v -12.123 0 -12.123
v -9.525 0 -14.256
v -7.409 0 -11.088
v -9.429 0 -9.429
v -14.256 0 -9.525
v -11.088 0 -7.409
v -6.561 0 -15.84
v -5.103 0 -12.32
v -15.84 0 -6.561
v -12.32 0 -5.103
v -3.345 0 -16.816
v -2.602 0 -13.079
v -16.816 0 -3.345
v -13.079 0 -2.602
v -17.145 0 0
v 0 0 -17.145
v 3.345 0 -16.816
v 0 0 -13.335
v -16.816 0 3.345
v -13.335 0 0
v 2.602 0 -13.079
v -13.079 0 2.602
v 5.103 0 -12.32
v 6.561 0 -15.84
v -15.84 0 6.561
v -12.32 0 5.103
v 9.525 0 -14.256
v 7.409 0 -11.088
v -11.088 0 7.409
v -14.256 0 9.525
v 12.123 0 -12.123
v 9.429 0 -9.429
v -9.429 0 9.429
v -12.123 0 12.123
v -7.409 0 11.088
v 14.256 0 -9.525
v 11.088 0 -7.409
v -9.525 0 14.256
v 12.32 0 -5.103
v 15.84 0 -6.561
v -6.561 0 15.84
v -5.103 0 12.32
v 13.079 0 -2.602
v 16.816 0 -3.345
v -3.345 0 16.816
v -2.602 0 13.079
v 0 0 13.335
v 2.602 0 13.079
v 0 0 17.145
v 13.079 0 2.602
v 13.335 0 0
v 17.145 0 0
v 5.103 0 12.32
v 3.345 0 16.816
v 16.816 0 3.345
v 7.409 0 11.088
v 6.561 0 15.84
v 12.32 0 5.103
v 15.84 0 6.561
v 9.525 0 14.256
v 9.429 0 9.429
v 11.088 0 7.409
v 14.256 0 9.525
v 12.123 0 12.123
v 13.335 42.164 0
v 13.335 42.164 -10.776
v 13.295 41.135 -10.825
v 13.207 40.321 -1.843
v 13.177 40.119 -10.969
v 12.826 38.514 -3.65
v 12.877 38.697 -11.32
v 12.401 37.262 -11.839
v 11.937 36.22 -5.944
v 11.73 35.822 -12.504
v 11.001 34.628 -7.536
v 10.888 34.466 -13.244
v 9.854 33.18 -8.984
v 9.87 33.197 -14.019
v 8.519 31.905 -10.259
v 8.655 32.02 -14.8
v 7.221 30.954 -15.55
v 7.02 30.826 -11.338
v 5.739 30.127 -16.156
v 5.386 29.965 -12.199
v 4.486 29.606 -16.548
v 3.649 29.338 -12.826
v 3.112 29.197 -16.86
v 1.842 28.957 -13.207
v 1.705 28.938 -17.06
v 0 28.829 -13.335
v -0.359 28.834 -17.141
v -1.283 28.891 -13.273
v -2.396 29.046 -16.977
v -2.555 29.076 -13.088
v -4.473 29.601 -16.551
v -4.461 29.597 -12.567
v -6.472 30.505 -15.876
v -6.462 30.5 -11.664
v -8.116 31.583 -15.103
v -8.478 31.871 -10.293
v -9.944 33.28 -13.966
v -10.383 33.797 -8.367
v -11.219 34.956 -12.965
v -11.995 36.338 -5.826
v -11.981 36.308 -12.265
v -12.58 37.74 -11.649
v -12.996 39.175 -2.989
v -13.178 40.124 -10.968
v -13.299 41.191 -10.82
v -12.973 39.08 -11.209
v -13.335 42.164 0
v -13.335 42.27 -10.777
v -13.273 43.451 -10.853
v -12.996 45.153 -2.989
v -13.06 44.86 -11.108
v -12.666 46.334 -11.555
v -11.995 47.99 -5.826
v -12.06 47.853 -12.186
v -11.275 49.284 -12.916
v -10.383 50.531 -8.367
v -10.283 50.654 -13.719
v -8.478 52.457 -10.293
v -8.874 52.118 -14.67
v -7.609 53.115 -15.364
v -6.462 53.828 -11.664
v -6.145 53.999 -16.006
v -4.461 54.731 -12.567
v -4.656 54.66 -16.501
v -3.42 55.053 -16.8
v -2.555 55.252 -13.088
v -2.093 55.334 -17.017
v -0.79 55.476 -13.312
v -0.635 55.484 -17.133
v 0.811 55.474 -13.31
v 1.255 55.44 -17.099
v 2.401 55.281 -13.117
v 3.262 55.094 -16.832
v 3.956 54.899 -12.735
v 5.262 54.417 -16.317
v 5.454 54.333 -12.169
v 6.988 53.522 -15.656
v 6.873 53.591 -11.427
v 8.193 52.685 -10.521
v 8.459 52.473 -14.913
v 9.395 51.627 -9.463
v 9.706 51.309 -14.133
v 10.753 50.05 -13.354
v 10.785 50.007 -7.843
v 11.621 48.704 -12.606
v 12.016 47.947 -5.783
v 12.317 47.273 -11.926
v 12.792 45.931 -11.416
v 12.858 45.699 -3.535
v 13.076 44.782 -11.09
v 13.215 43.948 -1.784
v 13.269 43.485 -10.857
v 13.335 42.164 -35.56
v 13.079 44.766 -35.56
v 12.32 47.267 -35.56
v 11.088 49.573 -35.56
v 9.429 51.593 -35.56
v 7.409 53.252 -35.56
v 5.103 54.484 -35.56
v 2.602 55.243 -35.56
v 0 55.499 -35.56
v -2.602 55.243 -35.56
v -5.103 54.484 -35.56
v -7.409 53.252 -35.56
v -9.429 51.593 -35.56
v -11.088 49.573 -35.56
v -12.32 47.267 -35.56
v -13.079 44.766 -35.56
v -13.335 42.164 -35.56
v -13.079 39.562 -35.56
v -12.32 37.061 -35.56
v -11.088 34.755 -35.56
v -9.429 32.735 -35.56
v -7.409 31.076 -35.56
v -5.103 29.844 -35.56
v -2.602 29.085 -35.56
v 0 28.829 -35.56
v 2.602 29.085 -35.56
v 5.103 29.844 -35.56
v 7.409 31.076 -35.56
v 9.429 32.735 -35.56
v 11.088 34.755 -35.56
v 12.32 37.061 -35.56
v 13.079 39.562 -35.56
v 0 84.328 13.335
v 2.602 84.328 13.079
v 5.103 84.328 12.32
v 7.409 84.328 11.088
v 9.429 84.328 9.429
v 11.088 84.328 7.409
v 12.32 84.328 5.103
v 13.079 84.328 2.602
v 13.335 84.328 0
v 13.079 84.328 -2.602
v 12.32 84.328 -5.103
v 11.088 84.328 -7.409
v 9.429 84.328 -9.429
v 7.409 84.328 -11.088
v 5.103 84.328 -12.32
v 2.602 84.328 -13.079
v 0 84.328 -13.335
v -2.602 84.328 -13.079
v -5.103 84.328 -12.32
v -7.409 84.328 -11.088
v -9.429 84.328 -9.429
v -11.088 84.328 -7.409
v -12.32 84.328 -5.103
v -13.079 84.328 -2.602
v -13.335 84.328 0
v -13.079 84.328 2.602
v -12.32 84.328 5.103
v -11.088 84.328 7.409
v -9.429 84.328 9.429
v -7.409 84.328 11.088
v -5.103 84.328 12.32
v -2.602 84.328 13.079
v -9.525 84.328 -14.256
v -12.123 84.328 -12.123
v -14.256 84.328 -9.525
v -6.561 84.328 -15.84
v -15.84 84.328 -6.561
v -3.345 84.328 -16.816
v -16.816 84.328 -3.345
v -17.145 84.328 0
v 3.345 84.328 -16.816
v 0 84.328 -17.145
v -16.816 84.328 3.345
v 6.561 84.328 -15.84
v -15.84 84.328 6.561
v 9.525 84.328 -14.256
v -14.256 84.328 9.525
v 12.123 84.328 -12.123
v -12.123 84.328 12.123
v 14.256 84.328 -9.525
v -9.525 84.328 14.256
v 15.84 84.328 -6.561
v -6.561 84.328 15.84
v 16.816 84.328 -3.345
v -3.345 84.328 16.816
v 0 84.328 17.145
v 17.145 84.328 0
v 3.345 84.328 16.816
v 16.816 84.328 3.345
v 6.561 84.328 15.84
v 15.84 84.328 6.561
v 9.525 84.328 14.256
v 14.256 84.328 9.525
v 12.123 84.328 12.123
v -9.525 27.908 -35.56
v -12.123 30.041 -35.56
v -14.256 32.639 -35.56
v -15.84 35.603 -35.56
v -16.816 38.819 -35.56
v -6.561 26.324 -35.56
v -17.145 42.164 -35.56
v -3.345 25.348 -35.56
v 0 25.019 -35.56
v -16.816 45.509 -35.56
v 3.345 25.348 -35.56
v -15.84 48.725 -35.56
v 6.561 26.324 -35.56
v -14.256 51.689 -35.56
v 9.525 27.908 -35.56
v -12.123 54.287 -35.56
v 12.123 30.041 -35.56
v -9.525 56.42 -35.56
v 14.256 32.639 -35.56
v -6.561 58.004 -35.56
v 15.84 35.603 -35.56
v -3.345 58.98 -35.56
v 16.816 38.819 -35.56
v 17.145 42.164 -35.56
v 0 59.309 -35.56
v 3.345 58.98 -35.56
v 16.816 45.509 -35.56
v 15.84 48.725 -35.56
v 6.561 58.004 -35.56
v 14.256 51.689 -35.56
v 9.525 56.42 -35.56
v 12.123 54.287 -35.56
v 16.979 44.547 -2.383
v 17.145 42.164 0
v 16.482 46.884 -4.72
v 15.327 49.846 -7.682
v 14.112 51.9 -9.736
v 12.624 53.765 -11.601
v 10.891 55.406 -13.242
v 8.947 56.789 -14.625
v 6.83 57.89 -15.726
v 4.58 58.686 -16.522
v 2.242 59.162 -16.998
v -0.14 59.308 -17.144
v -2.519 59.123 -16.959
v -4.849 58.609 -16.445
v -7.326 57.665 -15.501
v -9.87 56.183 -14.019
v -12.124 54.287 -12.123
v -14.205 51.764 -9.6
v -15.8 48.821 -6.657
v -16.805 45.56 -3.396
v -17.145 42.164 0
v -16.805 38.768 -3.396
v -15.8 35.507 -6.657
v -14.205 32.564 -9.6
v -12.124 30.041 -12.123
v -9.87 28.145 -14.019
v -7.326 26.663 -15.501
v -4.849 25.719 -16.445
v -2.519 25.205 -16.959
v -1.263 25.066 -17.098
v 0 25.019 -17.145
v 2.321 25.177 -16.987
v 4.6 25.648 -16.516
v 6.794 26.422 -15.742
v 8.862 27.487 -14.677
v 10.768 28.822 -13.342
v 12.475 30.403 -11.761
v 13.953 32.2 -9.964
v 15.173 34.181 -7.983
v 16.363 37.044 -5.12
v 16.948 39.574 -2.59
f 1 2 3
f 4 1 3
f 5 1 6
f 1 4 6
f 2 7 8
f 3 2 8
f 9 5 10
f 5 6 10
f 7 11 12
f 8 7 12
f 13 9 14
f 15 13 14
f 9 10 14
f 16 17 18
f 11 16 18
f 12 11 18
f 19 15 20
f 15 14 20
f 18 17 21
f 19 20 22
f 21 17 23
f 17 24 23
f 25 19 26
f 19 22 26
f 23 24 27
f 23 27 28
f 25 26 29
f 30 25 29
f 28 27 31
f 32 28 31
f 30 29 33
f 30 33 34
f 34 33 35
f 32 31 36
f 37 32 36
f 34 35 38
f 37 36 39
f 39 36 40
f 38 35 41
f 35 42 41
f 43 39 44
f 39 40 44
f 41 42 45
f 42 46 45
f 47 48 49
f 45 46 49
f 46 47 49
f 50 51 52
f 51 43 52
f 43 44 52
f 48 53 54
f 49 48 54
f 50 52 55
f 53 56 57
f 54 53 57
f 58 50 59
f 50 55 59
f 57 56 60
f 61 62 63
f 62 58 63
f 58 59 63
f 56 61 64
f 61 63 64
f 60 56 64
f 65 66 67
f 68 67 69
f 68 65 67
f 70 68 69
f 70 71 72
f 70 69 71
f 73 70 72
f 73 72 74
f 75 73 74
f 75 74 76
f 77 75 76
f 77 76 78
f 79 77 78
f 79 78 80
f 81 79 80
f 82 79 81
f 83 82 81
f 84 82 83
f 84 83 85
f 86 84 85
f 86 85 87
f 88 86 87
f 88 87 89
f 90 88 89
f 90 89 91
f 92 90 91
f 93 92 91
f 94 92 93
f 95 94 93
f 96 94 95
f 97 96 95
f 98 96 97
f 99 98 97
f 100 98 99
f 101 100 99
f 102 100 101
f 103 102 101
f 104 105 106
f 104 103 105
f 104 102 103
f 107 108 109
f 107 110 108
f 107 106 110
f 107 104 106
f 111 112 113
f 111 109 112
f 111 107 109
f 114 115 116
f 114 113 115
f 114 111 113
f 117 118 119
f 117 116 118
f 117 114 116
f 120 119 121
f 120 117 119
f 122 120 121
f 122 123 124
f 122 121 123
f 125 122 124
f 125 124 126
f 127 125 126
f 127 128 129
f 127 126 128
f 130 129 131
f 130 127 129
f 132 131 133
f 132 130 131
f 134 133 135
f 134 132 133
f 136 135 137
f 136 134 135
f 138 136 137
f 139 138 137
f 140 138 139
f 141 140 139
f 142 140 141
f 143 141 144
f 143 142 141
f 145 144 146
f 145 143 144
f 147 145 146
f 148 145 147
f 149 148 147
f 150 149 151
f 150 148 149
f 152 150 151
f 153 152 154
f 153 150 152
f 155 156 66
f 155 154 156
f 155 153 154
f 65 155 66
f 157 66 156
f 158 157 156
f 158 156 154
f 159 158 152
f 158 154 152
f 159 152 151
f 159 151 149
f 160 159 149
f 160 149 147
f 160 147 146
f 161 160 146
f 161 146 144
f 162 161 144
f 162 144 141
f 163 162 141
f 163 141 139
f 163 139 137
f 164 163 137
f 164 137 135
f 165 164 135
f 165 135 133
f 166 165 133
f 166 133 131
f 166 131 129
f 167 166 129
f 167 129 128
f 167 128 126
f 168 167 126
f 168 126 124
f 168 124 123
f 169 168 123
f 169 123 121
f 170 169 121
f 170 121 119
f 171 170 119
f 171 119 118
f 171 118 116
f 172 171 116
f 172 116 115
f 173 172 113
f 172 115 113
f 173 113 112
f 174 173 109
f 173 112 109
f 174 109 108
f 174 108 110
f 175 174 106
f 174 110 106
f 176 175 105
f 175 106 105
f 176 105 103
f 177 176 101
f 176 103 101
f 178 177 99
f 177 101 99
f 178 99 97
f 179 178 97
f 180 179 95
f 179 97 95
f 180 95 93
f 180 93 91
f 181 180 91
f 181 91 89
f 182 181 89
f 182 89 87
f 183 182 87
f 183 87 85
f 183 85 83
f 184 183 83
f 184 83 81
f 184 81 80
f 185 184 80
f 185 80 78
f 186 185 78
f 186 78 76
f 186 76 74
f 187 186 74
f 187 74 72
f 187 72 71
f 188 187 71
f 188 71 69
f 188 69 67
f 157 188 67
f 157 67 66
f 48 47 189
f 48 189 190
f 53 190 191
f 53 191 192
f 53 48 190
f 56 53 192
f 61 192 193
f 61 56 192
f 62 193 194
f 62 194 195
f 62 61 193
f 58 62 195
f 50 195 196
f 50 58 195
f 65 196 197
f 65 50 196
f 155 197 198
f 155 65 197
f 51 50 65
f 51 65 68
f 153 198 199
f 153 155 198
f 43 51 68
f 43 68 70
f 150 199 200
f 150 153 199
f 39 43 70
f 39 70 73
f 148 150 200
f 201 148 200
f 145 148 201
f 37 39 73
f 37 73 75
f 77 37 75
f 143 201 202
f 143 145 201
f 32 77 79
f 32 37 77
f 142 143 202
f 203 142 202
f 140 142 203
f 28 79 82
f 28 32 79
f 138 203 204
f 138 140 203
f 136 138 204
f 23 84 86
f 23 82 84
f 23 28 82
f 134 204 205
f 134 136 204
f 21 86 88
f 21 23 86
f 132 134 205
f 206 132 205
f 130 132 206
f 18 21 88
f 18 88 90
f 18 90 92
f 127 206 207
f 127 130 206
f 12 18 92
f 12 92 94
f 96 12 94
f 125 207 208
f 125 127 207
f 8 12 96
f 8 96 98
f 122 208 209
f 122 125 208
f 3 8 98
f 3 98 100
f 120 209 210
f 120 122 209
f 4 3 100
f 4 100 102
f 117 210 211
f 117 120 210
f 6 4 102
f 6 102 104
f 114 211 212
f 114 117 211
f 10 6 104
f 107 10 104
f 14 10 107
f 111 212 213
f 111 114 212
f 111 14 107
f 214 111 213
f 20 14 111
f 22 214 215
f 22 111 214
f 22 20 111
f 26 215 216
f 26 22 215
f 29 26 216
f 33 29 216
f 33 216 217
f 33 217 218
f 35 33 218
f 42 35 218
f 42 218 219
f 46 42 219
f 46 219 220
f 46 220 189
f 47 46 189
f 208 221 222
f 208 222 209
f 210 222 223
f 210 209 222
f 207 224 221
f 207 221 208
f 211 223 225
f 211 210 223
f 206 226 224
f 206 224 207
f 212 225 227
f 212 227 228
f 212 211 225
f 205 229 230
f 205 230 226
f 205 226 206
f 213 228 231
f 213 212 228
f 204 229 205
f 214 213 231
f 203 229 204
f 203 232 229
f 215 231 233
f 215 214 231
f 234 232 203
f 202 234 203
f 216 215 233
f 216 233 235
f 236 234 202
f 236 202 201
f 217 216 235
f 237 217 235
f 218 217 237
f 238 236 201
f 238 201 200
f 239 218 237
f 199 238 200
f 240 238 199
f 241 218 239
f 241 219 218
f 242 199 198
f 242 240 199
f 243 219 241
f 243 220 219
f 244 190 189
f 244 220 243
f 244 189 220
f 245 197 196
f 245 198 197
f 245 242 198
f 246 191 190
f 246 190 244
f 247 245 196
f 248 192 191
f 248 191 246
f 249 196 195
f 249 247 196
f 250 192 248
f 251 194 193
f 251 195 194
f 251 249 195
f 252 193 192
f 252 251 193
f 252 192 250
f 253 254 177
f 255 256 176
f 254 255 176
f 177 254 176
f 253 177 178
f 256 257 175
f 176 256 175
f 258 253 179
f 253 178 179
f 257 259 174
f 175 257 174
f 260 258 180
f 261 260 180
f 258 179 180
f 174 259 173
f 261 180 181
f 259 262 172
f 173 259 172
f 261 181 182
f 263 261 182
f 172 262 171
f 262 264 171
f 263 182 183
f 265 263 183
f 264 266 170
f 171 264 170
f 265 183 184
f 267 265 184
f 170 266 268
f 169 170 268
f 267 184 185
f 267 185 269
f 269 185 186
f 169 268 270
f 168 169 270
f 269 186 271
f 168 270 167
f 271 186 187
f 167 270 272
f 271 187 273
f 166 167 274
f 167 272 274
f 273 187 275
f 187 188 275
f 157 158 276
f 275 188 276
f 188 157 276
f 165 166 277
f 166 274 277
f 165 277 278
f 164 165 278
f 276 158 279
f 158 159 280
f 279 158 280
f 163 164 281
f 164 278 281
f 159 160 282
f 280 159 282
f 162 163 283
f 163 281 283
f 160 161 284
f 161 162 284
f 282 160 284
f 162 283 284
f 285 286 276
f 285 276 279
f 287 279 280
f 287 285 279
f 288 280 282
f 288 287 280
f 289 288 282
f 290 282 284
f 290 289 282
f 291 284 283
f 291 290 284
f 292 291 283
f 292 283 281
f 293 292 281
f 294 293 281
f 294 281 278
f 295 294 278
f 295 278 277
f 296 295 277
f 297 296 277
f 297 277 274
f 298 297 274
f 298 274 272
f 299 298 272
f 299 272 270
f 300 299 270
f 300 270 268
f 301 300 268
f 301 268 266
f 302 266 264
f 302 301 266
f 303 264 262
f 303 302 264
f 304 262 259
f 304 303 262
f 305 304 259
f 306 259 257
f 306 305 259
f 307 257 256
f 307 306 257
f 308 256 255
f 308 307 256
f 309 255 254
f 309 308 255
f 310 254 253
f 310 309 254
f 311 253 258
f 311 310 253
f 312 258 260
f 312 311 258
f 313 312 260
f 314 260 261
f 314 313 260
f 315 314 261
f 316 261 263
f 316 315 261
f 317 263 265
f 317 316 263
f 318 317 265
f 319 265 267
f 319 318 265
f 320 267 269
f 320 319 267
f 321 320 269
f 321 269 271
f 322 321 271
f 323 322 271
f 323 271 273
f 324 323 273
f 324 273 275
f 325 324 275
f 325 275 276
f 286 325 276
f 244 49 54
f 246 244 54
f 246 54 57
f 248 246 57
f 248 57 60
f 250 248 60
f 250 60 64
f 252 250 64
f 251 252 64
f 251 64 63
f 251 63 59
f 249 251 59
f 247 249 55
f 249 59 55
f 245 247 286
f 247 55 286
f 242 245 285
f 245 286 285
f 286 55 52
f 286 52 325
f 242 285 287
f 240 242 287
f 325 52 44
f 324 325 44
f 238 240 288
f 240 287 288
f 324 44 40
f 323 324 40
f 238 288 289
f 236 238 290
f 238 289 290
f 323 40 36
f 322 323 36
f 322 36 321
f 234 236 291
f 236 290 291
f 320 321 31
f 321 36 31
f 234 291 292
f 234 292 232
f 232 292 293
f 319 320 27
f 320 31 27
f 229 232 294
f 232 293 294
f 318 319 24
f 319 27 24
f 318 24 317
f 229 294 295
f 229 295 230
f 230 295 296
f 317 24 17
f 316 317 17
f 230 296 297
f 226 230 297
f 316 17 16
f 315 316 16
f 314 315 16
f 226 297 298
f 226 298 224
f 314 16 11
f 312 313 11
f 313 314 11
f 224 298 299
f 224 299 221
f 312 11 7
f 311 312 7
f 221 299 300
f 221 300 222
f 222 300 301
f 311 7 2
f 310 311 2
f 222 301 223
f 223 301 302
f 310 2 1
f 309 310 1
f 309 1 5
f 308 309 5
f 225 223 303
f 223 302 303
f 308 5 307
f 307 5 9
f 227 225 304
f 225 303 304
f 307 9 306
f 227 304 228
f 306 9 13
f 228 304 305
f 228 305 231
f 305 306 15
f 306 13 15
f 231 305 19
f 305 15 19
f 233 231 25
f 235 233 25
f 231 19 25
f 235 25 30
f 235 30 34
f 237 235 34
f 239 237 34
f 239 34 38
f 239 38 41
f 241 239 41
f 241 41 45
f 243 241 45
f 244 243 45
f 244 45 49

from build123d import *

# Parameters (mm, degrees)
SKETCH1_R           = 17.145
SKETCH1_R_2         = 13.335
BOSS_EXTRUDE1_DEPTH = 84.328
SKETCH2_R           = 17.145
SKETCH2_R_2         = 13.335
BOSS_EXTRUDE2_DEPTH = 35.56
SKETCH3_R           = 13.335
CUT_EXTRUDE1_DEPTH  = 94.111096186
CUT_EXTRUDE2_START  = -35.56
SKETCH4_R           = 13.335
CUT_EXTRUDE2_DEPTH  = 35.56


with BuildPart() as part:
    # Sketch1 → Boss-Extrude1 (new body)
    with BuildSketch(Plane(origin=(0, 0, 0), x_dir=(1, 0, 0), z_dir=(0, 1, 0))):
        with Locations(Location((0, 0, 0), (0, 0, 270))):
            Circle(SKETCH1_R)
        with Locations(Location((0, 0, 0), (0, 0, 270))):
            Circle(SKETCH1_R_2, mode=Mode.SUBTRACT)
    extrude(amount=BOSS_EXTRUDE1_DEPTH)

    # Sketch2 → Boss-Extrude2 (add)
    with BuildSketch(Plane.XY):
        with Locations((0, 42.164)):
            Circle(SKETCH2_R)
        with Locations((0, 42.164)):
            Circle(SKETCH2_R_2, mode=Mode.SUBTRACT)
    extrude(amount=-BOSS_EXTRUDE2_DEPTH)

    # Sketch3 → Cut-Extrude1 (cut, through all)
    with BuildSketch(Plane(origin=(0, 84.328, 0), x_dir=(1, 0, 0), z_dir=(0, 1, 0))):
        with Locations(Location((0, 0, 0), (0, 0, 270))):
            Circle(SKETCH3_R)
    extrude(amount=-CUT_EXTRUDE1_DEPTH, mode=Mode.SUBTRACT)

    # Sketch4 → Cut-Extrude2 (cut)
    with BuildSketch(Plane(origin=(0, 0, -35.56), x_dir=(-1, 0, 0), z_dir=(0, 0, -1)).offset(CUT_EXTRUDE2_START)):
        with Locations(Location((0, 42.164, 0), (0, 0, 180))):
            Circle(SKETCH4_R)
    extrude(amount=CUT_EXTRUDE2_DEPTH, mode=Mode.SUBTRACT)


solid = part.part
